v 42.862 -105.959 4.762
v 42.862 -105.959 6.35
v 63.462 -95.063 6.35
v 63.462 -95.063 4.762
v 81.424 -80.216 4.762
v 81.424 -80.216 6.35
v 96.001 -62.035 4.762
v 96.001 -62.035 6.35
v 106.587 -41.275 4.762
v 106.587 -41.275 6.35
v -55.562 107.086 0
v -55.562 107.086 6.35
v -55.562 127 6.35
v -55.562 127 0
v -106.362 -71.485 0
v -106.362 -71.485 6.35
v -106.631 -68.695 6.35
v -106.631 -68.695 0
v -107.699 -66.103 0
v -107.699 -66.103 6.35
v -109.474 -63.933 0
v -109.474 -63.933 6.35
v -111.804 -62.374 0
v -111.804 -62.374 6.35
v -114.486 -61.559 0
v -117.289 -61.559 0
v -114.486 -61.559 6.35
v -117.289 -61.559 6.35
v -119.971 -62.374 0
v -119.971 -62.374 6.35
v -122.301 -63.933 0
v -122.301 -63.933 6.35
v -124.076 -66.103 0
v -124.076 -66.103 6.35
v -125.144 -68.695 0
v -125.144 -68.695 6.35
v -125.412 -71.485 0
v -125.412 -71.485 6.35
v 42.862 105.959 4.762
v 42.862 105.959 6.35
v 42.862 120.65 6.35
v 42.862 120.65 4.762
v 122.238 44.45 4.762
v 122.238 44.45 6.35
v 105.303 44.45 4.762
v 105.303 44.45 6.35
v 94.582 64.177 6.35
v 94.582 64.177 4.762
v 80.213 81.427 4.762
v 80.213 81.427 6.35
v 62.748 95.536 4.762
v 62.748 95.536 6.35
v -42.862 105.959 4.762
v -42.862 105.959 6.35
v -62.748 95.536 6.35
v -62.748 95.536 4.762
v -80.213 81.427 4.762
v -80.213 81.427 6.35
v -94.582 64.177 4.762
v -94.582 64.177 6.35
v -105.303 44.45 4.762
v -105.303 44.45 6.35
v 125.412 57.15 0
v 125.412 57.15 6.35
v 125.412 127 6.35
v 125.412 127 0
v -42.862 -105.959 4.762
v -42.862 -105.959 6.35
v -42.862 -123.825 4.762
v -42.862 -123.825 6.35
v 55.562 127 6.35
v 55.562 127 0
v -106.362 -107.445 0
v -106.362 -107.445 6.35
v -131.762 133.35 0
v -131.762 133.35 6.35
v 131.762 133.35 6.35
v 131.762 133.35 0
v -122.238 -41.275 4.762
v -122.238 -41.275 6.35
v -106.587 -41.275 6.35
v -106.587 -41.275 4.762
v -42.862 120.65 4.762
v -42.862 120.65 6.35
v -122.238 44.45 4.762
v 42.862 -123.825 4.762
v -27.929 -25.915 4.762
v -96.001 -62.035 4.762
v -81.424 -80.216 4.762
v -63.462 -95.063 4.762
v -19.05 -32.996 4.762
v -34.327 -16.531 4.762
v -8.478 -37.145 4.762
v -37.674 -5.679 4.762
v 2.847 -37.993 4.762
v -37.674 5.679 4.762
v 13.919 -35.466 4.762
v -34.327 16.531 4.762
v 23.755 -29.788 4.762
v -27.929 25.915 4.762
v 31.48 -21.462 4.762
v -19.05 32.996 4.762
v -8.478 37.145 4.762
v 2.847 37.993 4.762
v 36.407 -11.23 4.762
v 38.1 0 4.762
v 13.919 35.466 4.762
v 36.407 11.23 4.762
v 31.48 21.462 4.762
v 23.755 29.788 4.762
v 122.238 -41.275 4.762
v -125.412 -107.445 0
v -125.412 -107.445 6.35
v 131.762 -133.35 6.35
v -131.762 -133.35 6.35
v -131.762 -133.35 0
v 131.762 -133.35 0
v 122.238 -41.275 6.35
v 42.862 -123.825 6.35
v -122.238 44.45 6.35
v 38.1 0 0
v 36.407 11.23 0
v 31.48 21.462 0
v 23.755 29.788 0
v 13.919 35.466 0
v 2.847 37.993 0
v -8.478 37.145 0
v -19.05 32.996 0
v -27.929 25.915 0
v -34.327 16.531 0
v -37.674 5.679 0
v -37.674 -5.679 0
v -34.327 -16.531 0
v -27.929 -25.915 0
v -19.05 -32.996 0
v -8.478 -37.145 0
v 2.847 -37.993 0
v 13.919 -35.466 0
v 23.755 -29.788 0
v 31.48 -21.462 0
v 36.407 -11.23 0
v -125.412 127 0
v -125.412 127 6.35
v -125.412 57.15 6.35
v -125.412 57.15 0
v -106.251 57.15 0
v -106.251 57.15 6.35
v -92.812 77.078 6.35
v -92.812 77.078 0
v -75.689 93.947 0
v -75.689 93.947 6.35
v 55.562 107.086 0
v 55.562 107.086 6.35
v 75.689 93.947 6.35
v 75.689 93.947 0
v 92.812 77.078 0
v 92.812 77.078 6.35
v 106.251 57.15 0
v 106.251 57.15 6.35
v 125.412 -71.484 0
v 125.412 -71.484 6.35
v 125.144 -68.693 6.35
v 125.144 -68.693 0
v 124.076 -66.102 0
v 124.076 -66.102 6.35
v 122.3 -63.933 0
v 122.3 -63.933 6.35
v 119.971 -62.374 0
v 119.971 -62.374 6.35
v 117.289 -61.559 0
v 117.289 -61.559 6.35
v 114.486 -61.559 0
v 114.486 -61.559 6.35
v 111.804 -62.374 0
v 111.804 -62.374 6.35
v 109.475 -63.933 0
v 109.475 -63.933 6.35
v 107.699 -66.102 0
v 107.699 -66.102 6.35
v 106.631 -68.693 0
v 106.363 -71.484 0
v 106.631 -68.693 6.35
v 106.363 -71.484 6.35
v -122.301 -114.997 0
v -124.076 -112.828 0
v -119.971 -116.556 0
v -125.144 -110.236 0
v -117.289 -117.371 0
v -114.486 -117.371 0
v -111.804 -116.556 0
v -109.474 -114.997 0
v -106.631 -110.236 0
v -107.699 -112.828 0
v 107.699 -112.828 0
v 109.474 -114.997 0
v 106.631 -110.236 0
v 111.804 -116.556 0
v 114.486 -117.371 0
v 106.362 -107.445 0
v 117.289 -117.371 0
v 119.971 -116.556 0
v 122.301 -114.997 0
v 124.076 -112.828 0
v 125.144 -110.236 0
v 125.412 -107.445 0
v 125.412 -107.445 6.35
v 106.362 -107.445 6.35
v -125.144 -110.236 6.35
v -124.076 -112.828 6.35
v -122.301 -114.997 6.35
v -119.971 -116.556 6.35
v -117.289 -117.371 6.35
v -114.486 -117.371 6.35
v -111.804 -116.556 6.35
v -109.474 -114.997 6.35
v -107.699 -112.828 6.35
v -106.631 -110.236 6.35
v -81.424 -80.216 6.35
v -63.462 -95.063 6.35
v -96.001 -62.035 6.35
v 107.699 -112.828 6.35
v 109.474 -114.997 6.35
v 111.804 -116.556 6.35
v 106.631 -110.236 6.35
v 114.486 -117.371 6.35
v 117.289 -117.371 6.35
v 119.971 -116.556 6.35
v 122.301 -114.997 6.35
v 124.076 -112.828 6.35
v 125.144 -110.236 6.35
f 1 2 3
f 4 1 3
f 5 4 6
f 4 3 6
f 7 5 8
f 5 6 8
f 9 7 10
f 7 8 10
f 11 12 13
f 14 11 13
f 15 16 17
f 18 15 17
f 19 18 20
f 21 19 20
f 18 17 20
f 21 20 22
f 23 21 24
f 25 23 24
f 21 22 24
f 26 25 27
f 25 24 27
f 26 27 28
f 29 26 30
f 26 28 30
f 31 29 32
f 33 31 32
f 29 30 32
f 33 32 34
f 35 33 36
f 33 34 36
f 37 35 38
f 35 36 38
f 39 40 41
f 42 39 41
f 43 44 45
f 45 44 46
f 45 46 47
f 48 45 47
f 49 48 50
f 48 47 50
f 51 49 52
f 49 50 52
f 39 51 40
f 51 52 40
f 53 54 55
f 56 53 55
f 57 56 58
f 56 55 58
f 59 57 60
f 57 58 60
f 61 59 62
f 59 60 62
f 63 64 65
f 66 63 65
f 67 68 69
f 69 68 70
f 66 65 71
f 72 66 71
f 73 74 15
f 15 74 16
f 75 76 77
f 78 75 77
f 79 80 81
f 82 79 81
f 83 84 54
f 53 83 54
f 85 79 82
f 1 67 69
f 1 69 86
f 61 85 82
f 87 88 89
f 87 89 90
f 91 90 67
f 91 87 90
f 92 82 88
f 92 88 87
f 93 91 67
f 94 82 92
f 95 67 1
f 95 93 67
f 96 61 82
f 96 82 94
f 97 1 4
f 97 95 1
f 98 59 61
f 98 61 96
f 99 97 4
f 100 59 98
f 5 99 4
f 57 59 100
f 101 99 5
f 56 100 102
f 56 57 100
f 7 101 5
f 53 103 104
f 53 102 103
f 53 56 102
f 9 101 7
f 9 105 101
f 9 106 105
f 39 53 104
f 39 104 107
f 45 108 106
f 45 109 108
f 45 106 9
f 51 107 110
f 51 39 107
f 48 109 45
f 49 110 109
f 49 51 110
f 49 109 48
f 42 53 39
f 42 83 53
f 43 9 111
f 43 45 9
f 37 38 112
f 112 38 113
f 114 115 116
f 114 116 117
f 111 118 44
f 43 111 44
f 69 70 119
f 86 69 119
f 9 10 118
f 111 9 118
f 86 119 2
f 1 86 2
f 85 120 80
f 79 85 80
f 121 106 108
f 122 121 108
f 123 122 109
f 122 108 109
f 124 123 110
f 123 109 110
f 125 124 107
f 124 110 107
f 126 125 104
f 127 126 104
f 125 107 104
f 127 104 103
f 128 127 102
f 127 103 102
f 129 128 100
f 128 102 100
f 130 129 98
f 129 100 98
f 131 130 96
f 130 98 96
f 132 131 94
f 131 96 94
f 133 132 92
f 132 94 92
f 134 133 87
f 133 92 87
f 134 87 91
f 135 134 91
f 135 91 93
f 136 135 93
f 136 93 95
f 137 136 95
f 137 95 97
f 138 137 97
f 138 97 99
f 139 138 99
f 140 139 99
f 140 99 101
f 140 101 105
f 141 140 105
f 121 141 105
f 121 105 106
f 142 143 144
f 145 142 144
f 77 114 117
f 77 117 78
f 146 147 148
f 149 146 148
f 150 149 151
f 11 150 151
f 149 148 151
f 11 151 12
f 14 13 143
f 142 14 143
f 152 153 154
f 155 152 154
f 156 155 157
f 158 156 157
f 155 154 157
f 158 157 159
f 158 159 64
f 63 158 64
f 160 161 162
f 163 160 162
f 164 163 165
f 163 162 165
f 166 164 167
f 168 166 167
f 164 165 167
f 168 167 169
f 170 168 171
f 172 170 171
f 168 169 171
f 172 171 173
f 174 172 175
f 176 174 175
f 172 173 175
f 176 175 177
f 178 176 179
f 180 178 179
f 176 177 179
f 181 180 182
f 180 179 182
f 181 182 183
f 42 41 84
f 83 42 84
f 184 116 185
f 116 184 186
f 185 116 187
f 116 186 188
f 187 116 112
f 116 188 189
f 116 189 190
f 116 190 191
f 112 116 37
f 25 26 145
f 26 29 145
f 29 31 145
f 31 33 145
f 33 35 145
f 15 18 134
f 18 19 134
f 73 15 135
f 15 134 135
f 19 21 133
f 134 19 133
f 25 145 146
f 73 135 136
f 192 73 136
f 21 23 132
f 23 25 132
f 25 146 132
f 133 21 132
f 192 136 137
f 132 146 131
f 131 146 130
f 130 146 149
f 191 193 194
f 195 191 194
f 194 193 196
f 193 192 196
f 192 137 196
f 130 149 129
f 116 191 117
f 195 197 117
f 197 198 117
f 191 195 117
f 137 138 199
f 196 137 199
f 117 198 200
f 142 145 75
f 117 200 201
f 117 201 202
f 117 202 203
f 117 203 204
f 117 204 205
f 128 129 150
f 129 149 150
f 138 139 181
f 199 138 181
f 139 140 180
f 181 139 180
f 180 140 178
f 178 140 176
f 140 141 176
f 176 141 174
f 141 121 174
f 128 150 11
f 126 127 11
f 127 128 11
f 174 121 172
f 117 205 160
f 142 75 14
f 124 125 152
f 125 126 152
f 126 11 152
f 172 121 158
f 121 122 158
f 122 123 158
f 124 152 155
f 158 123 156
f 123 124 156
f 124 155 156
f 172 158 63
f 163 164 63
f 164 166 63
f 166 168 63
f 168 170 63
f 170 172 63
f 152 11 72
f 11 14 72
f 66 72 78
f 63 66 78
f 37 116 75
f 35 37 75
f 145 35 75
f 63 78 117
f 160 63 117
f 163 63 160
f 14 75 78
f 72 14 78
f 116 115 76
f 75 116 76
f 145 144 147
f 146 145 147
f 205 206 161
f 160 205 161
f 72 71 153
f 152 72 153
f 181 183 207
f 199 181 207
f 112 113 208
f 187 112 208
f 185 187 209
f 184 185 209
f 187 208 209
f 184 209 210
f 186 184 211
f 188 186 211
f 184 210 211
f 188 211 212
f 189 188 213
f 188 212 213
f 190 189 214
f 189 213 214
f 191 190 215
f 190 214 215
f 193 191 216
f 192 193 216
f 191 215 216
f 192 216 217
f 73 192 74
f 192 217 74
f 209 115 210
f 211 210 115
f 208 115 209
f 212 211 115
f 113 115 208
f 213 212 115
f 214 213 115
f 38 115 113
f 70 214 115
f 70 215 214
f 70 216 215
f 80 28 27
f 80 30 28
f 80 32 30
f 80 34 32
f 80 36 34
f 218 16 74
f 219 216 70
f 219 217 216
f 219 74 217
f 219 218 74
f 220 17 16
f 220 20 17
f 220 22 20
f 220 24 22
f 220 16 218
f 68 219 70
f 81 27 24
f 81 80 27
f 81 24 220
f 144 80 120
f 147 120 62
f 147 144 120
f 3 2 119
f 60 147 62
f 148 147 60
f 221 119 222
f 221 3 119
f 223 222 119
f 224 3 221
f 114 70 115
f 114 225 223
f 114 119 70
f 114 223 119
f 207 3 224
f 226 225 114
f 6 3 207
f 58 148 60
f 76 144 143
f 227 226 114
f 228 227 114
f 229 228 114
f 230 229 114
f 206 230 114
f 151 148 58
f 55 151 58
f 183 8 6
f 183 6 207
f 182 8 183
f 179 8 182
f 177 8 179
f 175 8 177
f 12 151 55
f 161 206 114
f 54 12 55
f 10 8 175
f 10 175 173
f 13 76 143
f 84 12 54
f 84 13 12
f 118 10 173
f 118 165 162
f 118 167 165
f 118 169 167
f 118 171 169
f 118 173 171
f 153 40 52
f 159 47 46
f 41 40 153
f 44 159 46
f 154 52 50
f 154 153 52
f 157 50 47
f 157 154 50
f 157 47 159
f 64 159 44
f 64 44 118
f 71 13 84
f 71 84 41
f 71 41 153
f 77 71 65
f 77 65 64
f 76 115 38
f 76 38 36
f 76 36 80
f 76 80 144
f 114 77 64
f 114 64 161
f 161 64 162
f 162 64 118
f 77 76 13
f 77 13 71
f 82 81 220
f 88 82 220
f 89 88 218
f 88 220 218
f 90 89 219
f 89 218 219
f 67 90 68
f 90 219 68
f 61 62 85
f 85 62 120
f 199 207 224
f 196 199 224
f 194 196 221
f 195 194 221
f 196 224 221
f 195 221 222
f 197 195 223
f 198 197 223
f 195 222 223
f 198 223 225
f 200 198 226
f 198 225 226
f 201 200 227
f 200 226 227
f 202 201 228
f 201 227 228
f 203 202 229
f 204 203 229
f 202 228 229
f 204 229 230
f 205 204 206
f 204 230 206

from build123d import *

# Parameters (mm, degrees)
F0_W      = 269.875
F0_H      = 273.05
F1_DEPTH  = 6.35
F3_DEPTH  = 6.35
F4_R      = 38.1
F5_DEPTH  = 6.35
F7_DEPTH  = 1.5875
F8_W      = 3.175
F8_H      = 273.05
F9_DEPTH  = 6.35
F10_W     = 263.525
F10_H     = 3.175
F11_DEPTH = 6.35
F12_W     = 263.525
F12_H     = 3.175
F13_DEPTH = 6.35


with BuildPart() as f1:
    # F0 (on Top) → F1 (new body)
    with BuildSketch(Plane.XY):
        Rectangle(F0_W, F0_H)
    extrude(amount=F1_DEPTH)

    # F2 (on face) → F3 (cut, through all)
    with BuildSketch(Plane.XY.offset(6.35)):
        with BuildLine():
            Line((-55.5625, 127), (-125.4125, 127))
            Line((-125.4125, 127), (-125.4125, 57.15))
            Line((-125.4125, 57.15), (-106.251468, 57.15))
            ThreePointArc((-106.251468, 57.15), (-84.672021, 85.939978), (-55.5625, 107.0864))
            Line((-55.5625, 107.0864), (-55.5625, 127))
        make_face()
        with BuildLine():
            Line((55.5625, 127), (55.5625, 107.0864))
            ThreePointArc((55.5625, 107.0864), (84.672021, 85.939978), (106.251468, 57.15))
            Line((106.251468, 57.15), (125.4125, 57.15))
            Line((125.4125, 57.15), (125.4125, 127))
            Line((125.4125, 127), (55.5625, 127))
        make_face()
        with BuildLine():
            ThreePointArc((-106.3625, -71.485033), (-115.8875, -61.4553), (-125.4125, -71.485033))
            Line((-125.4125, -71.485033), (-125.4125, -107.445267))
            ThreePointArc((-125.4125, -107.445267), (-115.8875, -117.475), (-106.3625, -107.445267))
            Line((-106.3625, -107.445267), (-106.3625, -71.485033))
        make_face()
        with BuildLine():
            ThreePointArc((125.4125, -71.483554), (115.8875, -61.455376), (106.3625, -71.483554))
            Line((106.3625, -71.483554), (106.3625, -107.445267))
            ThreePointArc((106.3625, -107.445267), (115.8875, -117.475), (125.4125, -107.445267))
            Line((125.4125, -107.445267), (125.4125, -71.483554))
        make_face()
    extrude(amount=-F3_DEPTH, mode=Mode.SUBTRACT)

    # F4 (on face) → F5 (cut, through all)
    with BuildSketch(Plane.XY.offset(6.35)):
        Circle(F4_R)
    extrude(amount=-F5_DEPTH, mode=Mode.SUBTRACT)

    # F6 (on face) → F7 (cut)
    with BuildSketch(Plane.XY.offset(6.35)):
        with BuildLine():
            ThreePointArc((106.587356, -41.275), (112.355295, -20.994705), (114.3, 0))
            ThreePointArc((114.3, 0), (112.028131, 22.675711), (105.302837, 44.45))
            Line((105.302837, 44.45), (42.8625, 44.45))
            Line((42.8625, 44.45), (42.8625, 105.958936))
            ThreePointArc((42.8625, 105.958936), (0, 114.3), (-42.8625, 105.958936))
            Line((-42.8625, 105.958936), (-42.8625, 44.45))
            Line((-42.8625, 44.45), (-105.302837, 44.45))
            ThreePointArc((-105.302837, 44.45), (-114.287171, 1.712499), (-106.587356, -41.275))
            Line((-106.587356, -41.275), (-42.8625, -41.275))
            Line((-42.8625, -41.275), (-42.8625, -105.958936))
            ThreePointArc((-42.8625, -105.958936), (0, -114.3), (42.8625, -105.958936))
            Line((42.8625, -105.958936), (42.8625, -41.275))
            Line((42.8625, -41.275), (106.587356, -41.275))
        make_face()
        with BuildLine():
            ThreePointArc((105.302837, 44.45), (112.028131, 22.675711), (114.3, 0))
            ThreePointArc((114.3, 0), (112.355295, -20.994705), (106.587356, -41.275))
            Line((106.587356, -41.275), (122.2375, -41.275))
            Line((122.2375, -41.275), (122.2375, 44.45))
            Line((122.2375, 44.45), (105.302837, 44.45))
        make_face()
        with BuildLine():
            Line((42.8625, 44.45), (105.302837, 44.45))
            ThreePointArc((105.302837, 44.45), (80.212711, 81.427335), (42.8625, 105.958936))
            Line((42.8625, 105.958936), (42.8625, 44.45))
        make_face()
        with BuildLine():
            ThreePointArc((42.8625, -105.958936), (81.423693, -80.216409), (106.587356, -41.275))
            Line((106.587356, -41.275), (42.8625, -41.275))
            Line((42.8625, -41.275), (42.8625, -105.958936))
        make_face()
        with BuildLine():
            ThreePointArc((-42.8625, 105.958936), (0, 114.3), (42.8625, 105.958936))
            Line((42.8625, 105.958936), (42.8625, 120.65))
            Line((42.8625, 120.65), (-42.8625, 120.65))
            Line((-42.8625, 120.65), (-42.8625, 105.958936))
        make_face()
        with BuildLine():
            Line((42.8625, -123.825), (42.8625, -105.958936))
            ThreePointArc((42.8625, -105.958936), (0, -114.3), (-42.8625, -105.958936))
            Line((-42.8625, -105.958936), (-42.8625, -123.825))
            Line((-42.8625, -123.825), (42.8625, -123.825))
        make_face()
        with BuildLine():
            Line((-42.8625, 44.45), (-42.8625, 105.958936))
            ThreePointArc((-42.8625, 105.958936), (-80.212711, 81.427335), (-105.302837, 44.45))
            Line((-105.302837, 44.45), (-42.8625, 44.45))
        make_face()
        with BuildLine():
            ThreePointArc((-106.587356, -41.275), (-81.423693, -80.216409), (-42.8625, -105.958936))
            Line((-42.8625, -105.958936), (-42.8625, -41.275))
            Line((-42.8625, -41.275), (-106.587356, -41.275))
        make_face()
        with BuildLine():
            ThreePointArc((-106.587356, -41.275), (-114.287171, 1.712499), (-105.302837, 44.45))
            Line((-105.302837, 44.45), (-122.2375, 44.45))
            Line((-122.2375, 44.45), (-122.2375, -41.275))
            Line((-122.2375, -41.275), (-106.587356, -41.275))
        make_face()
    extrude(amount=-F7_DEPTH, mode=Mode.SUBTRACT)

    # F8 (on face) → F9 (cut, through all)
    with BuildSketch(Plane.XY.offset(6.35)):
        with Locations((-133.35, 0)):
            Rectangle(F8_W, F8_H)
        with Locations((133.35, 0)):
            Rectangle(F8_W, F8_H)
    extrude(amount=-F9_DEPTH, mode=Mode.SUBTRACT)

    # F10 (on face) → F11 (cut, through all)
    with BuildSketch(Plane.XY.offset(6.35)):
        with Locations((0, 134.9375)):
            Rectangle(F10_W, F10_H)
    extrude(amount=-F11_DEPTH, mode=Mode.SUBTRACT)

    # F12 (on face) → F13 (cut, through all)
    with BuildSketch(Plane.XY.offset(6.35)):
        with Locations((0, -134.9375)):
            Rectangle(F12_W, F12_H)
    extrude(amount=-F13_DEPTH, mode=Mode.SUBTRACT)


solid = f1.part
